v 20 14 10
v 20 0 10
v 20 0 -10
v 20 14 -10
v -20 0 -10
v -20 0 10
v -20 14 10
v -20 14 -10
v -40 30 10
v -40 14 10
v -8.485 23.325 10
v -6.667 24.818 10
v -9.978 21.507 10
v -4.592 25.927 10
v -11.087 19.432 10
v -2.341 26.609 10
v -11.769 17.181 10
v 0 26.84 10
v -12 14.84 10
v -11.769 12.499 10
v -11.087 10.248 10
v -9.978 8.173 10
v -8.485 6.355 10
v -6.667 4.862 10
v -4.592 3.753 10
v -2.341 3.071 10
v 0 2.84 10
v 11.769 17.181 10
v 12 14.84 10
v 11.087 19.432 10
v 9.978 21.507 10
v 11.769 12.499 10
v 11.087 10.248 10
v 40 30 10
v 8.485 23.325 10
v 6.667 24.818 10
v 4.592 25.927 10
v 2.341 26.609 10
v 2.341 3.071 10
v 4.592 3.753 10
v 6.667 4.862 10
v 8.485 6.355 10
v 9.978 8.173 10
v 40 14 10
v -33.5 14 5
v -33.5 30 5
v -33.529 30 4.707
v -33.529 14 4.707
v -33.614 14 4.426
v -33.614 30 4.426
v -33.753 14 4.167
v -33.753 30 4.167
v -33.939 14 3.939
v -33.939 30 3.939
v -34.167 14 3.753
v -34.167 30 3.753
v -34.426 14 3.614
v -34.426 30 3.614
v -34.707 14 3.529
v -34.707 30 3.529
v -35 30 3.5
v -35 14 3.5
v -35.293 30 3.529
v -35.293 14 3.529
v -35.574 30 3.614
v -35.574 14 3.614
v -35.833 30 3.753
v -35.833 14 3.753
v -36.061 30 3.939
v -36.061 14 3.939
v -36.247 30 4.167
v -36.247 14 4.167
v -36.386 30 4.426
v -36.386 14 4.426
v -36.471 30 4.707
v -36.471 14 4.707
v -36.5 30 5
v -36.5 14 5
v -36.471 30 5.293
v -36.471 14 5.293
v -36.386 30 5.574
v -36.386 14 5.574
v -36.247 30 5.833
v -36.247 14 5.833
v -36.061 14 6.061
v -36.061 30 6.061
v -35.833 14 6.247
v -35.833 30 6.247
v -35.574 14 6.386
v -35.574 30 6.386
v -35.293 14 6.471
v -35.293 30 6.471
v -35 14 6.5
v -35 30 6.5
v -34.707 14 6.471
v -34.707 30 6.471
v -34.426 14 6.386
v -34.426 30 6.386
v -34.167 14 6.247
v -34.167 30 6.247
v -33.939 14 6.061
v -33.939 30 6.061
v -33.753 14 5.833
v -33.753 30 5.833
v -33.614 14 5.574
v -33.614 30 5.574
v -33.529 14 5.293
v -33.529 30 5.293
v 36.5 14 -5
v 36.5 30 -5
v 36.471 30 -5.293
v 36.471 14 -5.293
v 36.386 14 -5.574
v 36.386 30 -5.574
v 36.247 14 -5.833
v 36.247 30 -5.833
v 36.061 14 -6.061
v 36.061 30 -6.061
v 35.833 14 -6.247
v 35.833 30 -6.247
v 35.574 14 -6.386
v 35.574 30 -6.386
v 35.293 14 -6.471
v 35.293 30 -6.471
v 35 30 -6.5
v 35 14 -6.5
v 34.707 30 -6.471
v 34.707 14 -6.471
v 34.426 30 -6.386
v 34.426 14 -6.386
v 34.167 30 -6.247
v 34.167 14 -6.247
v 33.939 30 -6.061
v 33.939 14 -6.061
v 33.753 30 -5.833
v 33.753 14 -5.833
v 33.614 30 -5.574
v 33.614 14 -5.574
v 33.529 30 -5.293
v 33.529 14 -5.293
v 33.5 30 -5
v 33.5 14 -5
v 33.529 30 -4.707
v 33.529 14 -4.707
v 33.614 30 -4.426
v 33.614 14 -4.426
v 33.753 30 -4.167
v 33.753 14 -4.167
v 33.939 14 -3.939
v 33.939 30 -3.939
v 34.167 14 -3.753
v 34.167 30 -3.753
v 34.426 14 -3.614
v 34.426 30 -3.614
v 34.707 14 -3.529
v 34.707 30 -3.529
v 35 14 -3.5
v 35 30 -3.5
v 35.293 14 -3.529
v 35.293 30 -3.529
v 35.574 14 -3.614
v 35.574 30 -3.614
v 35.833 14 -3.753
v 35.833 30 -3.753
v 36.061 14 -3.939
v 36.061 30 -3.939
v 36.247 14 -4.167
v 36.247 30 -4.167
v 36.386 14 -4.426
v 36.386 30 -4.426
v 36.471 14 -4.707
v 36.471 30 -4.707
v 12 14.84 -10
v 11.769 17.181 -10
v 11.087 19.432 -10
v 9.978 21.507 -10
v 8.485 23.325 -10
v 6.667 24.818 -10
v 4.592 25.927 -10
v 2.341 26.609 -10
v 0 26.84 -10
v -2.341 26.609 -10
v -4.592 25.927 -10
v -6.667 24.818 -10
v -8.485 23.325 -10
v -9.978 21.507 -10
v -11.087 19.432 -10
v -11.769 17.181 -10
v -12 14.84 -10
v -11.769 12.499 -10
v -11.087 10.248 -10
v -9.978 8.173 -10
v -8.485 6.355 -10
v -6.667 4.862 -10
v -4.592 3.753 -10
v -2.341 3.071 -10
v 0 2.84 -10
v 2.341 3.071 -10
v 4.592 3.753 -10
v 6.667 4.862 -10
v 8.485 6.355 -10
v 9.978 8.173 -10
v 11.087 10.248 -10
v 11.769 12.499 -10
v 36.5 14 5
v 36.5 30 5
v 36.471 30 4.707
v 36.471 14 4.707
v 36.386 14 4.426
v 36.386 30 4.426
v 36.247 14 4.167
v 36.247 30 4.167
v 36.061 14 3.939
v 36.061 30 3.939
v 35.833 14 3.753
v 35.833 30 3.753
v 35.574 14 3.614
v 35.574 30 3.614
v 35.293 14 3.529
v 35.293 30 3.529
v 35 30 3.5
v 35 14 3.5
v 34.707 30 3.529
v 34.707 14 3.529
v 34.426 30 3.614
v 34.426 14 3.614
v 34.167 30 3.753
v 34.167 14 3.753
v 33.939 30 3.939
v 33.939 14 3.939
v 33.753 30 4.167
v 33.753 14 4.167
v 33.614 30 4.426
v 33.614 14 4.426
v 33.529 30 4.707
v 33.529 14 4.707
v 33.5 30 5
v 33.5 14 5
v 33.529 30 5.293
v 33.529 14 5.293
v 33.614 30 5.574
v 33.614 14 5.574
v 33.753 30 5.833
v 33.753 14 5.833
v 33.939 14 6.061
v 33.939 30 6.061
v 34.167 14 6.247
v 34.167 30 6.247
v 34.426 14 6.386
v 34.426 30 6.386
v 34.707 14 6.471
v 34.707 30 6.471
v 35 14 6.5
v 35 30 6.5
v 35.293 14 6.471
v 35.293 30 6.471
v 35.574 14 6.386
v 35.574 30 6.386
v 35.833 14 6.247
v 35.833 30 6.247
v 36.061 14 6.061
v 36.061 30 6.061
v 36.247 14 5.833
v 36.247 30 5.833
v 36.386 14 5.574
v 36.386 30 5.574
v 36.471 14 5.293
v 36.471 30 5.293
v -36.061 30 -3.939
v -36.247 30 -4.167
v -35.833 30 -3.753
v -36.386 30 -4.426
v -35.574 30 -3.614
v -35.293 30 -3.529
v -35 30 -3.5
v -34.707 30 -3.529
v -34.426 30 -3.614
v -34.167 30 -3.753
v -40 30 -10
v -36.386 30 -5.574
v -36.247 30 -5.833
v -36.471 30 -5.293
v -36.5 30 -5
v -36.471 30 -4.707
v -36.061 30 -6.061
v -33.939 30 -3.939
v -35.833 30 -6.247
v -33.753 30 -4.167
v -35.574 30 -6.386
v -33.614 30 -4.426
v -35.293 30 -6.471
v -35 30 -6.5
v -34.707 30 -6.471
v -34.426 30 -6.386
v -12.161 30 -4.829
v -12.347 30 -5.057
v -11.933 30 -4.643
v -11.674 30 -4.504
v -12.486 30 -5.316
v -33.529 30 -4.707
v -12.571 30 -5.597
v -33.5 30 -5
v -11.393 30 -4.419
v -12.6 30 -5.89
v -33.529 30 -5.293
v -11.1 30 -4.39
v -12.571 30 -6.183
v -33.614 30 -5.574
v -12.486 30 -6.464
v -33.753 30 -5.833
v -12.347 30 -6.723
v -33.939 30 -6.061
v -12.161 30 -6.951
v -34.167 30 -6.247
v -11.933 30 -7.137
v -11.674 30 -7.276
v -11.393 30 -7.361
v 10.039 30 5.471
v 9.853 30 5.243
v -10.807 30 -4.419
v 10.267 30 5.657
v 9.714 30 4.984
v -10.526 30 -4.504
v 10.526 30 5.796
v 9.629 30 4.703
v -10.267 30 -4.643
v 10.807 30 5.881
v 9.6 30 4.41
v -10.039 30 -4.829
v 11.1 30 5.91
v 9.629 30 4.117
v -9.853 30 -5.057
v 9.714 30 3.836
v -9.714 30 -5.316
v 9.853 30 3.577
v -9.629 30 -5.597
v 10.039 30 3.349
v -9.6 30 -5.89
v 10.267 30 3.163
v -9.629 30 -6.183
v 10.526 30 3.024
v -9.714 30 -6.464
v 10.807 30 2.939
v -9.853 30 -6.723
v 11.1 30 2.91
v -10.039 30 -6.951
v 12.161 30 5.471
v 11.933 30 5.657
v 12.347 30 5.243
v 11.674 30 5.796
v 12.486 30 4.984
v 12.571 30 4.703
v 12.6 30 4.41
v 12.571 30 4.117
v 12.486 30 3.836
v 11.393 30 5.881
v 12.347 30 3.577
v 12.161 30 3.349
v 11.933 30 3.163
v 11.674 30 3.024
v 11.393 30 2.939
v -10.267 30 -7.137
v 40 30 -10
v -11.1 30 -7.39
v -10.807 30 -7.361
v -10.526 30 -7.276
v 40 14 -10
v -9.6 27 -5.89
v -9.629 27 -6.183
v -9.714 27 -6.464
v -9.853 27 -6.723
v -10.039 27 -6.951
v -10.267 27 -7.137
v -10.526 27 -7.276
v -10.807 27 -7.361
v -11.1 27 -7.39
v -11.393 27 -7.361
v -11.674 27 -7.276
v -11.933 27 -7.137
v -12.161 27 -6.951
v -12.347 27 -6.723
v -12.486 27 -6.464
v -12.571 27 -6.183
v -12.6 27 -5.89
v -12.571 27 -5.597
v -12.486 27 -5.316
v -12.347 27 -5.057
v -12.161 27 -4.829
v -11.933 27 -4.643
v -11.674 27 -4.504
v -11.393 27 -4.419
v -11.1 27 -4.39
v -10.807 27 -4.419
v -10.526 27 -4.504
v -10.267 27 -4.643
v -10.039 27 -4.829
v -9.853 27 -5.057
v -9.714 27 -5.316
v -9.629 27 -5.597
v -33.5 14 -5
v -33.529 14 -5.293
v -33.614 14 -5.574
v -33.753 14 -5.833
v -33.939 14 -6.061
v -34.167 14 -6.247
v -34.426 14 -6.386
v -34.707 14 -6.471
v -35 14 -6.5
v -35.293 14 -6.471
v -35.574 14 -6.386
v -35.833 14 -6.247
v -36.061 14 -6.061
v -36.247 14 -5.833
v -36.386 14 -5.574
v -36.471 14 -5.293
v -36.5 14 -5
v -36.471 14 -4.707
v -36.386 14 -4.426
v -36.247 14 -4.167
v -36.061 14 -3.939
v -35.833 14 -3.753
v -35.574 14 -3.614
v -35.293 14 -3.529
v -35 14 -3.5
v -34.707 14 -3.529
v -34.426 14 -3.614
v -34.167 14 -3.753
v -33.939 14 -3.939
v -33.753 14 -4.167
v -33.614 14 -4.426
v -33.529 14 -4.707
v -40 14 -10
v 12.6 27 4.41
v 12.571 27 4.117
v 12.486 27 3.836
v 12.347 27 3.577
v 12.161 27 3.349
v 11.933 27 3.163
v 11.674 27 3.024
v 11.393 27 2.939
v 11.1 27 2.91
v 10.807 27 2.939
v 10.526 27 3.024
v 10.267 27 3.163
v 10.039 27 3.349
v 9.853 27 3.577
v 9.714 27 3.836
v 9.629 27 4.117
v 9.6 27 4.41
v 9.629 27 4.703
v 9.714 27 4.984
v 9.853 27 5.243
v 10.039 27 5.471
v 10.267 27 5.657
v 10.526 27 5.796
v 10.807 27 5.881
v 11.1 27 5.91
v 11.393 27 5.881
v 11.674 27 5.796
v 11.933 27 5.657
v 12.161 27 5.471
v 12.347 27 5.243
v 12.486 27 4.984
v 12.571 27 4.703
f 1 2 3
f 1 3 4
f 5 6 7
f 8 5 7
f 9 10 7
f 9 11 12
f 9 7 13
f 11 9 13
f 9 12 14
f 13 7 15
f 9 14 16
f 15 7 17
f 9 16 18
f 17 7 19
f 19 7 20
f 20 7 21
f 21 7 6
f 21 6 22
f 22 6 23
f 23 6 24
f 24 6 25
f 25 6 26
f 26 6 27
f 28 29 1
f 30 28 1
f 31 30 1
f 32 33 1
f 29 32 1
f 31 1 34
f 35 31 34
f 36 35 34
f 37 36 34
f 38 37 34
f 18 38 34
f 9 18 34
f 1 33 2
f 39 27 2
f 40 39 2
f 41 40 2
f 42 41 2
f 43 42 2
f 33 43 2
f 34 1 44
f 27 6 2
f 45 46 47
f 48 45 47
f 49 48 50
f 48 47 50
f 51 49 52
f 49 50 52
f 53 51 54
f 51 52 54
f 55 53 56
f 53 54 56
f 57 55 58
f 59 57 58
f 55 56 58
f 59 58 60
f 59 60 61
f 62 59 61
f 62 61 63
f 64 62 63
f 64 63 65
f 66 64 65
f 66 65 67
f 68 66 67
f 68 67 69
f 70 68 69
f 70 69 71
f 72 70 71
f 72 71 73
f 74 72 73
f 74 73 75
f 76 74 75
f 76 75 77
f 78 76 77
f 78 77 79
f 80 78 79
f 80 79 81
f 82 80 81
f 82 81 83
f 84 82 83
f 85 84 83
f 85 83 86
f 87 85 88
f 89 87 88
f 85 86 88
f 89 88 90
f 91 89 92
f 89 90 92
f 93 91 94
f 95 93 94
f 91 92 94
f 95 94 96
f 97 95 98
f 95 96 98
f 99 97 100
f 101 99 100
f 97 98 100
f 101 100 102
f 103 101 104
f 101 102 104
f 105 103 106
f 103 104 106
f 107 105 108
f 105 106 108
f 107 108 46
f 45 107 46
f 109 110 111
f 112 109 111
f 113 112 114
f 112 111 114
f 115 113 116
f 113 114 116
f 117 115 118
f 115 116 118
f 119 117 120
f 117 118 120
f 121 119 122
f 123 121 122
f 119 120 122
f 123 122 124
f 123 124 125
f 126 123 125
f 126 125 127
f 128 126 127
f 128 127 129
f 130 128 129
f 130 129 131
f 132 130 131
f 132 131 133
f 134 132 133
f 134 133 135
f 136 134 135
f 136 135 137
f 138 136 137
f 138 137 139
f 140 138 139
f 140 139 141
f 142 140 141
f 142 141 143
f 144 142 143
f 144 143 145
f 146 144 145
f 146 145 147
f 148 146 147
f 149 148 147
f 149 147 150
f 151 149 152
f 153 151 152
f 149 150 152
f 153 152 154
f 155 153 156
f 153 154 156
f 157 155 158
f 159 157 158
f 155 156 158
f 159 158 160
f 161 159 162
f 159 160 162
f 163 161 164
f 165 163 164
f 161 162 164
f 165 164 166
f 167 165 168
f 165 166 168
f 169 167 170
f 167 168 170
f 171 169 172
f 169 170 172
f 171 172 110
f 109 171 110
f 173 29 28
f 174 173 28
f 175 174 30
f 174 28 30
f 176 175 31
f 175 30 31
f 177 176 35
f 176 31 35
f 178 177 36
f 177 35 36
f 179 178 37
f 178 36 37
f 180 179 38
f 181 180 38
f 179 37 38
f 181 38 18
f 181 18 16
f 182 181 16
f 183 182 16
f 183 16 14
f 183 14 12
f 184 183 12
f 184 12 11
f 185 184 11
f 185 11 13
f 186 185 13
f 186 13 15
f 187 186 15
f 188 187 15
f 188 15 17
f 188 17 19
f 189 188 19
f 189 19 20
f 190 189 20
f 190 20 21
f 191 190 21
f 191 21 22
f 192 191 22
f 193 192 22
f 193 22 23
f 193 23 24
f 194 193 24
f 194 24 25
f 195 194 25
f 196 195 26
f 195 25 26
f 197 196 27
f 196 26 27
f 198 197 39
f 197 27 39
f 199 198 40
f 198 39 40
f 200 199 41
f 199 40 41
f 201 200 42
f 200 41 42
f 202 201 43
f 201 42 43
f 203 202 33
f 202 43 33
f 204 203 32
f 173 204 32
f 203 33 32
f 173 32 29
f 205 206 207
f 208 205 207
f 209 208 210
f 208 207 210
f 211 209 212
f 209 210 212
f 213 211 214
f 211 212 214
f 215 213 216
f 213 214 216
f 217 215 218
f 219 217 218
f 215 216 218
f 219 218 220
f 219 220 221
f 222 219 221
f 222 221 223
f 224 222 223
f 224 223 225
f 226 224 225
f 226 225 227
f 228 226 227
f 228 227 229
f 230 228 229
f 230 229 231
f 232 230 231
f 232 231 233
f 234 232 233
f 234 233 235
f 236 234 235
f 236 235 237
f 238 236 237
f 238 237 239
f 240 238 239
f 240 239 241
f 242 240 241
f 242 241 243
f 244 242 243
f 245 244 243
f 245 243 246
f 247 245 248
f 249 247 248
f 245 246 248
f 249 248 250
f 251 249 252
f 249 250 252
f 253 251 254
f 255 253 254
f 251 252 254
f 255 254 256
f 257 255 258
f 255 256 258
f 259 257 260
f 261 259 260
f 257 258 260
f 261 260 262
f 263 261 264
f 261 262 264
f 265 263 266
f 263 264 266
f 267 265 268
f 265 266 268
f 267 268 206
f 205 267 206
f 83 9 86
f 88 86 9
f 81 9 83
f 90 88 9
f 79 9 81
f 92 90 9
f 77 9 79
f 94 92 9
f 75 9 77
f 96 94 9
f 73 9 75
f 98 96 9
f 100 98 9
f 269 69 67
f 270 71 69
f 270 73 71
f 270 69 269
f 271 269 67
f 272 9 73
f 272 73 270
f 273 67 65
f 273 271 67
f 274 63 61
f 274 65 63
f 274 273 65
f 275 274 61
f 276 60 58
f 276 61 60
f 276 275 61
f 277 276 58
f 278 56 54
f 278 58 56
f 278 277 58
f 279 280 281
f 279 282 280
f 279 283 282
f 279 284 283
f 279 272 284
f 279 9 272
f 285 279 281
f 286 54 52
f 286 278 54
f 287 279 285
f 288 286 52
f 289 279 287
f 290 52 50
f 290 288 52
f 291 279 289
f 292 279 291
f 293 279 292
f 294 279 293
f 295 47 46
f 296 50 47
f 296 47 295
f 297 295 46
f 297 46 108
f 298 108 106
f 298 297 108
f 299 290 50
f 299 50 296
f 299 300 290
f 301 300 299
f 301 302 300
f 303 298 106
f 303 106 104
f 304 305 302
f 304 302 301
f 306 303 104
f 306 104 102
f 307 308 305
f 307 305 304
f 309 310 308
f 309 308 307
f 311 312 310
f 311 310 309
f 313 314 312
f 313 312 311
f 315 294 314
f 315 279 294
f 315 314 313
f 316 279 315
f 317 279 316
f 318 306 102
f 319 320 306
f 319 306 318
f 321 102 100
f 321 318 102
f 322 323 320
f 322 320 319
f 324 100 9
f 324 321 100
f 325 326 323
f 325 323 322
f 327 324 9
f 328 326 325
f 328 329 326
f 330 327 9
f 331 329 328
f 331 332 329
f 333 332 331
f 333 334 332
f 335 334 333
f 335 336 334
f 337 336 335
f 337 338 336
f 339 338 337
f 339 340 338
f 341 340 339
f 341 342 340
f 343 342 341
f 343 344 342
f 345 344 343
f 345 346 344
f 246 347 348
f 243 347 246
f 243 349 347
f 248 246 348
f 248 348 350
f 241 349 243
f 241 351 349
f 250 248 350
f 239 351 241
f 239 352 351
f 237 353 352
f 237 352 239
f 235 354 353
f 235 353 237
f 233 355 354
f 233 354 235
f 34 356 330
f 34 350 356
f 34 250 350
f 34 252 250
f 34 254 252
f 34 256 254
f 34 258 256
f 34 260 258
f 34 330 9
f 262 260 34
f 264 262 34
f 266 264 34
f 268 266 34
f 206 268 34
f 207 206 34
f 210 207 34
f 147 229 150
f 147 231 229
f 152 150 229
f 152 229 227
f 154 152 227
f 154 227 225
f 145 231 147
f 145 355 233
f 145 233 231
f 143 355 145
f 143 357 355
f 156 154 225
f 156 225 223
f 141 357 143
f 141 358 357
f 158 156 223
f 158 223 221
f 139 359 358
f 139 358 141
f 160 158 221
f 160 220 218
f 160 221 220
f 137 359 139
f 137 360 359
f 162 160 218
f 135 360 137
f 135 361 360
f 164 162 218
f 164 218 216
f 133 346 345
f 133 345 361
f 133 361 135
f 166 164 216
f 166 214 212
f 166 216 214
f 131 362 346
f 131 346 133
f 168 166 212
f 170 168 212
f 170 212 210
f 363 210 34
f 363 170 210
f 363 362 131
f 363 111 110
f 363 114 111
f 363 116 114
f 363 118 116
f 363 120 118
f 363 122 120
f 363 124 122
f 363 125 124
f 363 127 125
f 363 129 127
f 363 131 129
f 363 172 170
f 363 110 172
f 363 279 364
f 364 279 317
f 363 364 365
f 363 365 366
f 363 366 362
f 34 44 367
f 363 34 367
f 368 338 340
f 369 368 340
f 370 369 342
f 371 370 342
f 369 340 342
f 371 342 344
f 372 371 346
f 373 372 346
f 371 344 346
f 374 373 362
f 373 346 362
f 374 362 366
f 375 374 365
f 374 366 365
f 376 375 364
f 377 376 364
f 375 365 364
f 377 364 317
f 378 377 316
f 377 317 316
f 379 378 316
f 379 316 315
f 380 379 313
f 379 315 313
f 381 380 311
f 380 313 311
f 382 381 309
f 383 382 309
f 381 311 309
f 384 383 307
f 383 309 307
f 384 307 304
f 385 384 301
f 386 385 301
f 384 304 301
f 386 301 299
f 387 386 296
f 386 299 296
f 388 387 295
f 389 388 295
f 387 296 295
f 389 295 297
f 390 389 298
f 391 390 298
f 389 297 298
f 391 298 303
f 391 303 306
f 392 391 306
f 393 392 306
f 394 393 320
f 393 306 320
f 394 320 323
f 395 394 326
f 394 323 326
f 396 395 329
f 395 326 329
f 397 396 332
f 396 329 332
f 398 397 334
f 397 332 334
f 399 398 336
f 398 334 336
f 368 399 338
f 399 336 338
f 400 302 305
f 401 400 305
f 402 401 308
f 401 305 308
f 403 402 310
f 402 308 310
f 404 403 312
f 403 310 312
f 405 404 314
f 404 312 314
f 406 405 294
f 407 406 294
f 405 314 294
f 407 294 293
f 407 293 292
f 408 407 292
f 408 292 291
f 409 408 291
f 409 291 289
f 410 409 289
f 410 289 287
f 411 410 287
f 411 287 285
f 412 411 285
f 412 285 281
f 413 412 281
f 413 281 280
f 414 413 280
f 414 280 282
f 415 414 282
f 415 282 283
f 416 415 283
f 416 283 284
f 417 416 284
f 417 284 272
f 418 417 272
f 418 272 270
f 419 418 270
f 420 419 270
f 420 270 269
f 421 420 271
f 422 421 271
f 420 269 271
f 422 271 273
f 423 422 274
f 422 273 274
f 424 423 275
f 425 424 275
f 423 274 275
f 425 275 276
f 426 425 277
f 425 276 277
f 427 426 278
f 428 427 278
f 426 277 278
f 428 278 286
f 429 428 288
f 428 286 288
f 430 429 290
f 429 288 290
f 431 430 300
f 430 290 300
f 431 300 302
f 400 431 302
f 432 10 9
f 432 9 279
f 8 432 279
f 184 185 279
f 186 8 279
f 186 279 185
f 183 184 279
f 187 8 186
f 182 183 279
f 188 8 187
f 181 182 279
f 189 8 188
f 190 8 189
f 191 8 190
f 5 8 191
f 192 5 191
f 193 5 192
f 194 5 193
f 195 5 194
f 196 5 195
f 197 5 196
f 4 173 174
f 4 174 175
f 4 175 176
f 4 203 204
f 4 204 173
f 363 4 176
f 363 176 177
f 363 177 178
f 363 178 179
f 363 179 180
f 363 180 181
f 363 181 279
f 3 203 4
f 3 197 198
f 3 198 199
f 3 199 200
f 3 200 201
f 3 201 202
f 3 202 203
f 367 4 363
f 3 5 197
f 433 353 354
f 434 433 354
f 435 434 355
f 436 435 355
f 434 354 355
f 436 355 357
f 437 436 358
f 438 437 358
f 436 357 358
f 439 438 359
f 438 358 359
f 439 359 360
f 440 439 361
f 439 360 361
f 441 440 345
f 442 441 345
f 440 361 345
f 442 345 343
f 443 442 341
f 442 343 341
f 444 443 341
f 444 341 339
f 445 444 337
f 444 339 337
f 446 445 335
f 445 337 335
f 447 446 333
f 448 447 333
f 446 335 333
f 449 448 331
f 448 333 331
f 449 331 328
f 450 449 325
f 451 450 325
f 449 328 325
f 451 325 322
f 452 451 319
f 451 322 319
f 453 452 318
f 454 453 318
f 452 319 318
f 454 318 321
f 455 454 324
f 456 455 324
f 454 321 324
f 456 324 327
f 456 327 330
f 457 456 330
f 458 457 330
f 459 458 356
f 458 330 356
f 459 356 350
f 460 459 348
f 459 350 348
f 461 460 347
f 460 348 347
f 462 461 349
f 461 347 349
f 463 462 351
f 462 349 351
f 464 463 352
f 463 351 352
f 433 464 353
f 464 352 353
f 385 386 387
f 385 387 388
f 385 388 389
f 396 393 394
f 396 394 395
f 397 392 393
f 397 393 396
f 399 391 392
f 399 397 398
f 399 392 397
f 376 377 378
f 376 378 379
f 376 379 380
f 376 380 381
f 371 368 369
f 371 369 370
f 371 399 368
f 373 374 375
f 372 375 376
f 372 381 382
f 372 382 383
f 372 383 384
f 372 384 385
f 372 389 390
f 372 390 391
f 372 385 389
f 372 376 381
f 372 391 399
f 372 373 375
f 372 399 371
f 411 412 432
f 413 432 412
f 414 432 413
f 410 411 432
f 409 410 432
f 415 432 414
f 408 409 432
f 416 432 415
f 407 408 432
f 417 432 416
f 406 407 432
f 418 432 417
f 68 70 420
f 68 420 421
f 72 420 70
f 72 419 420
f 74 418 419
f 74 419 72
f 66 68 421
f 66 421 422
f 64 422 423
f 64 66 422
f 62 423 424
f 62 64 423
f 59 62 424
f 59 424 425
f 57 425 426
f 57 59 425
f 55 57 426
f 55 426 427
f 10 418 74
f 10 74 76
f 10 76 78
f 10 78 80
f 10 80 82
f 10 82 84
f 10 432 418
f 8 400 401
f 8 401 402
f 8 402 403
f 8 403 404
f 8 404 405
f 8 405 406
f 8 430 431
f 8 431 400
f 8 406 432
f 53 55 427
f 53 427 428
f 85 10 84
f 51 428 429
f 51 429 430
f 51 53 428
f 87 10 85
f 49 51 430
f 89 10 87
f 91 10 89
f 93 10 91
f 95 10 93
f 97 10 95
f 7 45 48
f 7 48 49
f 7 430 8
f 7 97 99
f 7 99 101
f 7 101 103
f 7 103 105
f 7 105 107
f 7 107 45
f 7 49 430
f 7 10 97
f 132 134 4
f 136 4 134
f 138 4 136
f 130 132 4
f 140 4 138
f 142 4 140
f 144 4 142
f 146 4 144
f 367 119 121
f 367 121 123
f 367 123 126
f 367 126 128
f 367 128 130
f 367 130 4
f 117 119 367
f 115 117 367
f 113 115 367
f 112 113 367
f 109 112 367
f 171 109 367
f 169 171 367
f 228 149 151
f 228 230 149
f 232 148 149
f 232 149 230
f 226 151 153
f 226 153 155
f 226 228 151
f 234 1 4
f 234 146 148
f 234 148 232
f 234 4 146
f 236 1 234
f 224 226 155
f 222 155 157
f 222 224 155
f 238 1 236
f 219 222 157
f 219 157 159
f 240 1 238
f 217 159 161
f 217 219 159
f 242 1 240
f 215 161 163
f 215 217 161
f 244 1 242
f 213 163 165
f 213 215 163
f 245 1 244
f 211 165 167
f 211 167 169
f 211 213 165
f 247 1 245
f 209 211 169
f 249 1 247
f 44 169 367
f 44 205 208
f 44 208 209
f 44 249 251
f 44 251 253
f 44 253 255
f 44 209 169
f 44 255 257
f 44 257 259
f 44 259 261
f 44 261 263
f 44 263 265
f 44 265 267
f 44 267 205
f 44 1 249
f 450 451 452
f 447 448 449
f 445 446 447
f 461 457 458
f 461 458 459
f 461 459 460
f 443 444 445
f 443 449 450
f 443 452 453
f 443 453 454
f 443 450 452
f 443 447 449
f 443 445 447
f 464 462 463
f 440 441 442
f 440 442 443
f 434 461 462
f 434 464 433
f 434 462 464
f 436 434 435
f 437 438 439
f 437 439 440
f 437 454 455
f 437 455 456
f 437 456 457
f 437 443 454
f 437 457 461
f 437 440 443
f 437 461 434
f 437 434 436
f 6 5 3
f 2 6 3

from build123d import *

# Parameters (mm, degrees)
SKETCH2_W           = 80
SKETCH2_H           = 20
BOSS_EXTRUDE1_DEPTH = 30
SKETCH3_W           = 20
SKETCH3_H           = 14
CUT_EXTRUDE1_DEPTH  = 30
SKETCH4_R           = 12
CUT_EXTRUDE2_DEPTH  = 30
SKETCH5_R           = 1.5
CUT_EXTRUDE3_DEPTH  = 30
SKETCH6_R           = 1.5
CUT_EXTRUDE4_DEPTH  = 3


with BuildPart() as part:
    # Sketch2 → Boss-Extrude1 (new body)
    with BuildSketch(Plane(origin=(0, 0, 0), x_dir=(1, 0, 0), z_dir=(0, 1, 0))):
        Rectangle(SKETCH2_W, SKETCH2_H)
    extrude(amount=BOSS_EXTRUDE1_DEPTH)

    # Sketch3 → Cut-Extrude1 (cut)
    with BuildSketch(Plane.XY.offset(10)):
        with Locations((30, 7)):
            Rectangle(SKETCH3_W, SKETCH3_H)
        with Locations((-30, 7)):
            Rectangle(SKETCH3_W, SKETCH3_H)
    extrude(amount=-CUT_EXTRUDE1_DEPTH, mode=Mode.SUBTRACT)

    # Sketch4 → Cut-Extrude2 (cut)
    with BuildSketch(Plane.XY.offset(10)):
        with Locations((0, 14.84)):
            Circle(SKETCH4_R)
    extrude(amount=-CUT_EXTRUDE2_DEPTH, mode=Mode.SUBTRACT)

    # Sketch5 → Cut-Extrude3 (cut)
    with BuildSketch(Plane(origin=(0, 30, 0), x_dir=(1, 0, 0), z_dir=(0, 1, 0))):
        with Locations((-35, 5)):
            Circle(SKETCH5_R)
        with Locations((-35, -5)):
            Circle(SKETCH5_R)
        with Locations((35, -5)):
            Circle(SKETCH5_R)
        with Locations((35, 5)):
            Circle(SKETCH5_R)
    extrude(amount=-CUT_EXTRUDE3_DEPTH, mode=Mode.SUBTRACT)

    # Sketch6 → Cut-Extrude4 (cut)
    with BuildSketch(Plane(origin=(0, 30, 0), x_dir=(1, 0, 0), z_dir=(0, 1, 0))):
        with Locations((-11.1, 5.89)):
            Circle(SKETCH6_R)
        with Locations((11.1, -4.41)):
            Circle(SKETCH6_R)
    extrude(amount=-CUT_EXTRUDE4_DEPTH, mode=Mode.SUBTRACT)


solid = part.part
